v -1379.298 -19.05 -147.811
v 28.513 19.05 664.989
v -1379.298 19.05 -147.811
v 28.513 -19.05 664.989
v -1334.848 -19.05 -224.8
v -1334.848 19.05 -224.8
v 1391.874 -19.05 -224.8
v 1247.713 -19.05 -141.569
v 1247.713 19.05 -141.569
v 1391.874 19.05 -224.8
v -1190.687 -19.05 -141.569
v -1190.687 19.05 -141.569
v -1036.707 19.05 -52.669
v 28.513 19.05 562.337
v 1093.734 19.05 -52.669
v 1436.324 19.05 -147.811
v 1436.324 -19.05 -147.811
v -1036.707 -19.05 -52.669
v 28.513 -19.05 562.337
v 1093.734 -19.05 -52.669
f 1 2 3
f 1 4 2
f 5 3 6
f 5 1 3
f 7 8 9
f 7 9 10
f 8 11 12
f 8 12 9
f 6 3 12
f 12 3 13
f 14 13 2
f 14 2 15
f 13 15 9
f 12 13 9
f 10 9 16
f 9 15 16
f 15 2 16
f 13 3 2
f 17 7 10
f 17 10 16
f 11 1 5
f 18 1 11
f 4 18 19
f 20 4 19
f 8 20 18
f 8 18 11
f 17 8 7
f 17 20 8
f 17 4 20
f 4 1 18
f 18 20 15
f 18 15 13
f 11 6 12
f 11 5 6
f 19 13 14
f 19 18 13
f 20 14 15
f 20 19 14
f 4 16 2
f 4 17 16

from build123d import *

# Parameters (mm, degrees)
F1_DEPTH = 19.05


with BuildPart() as f1:
    # F0 (on Front) → F1 (new body, symmetric)
    with BuildSketch(Plane.XZ):
        Polygon((-1334.847673, -224.800255), (-1190.686777, -141.568923), (1247.713223, -141.568923), (1391.874119, -224.800255), (1436.324119, -147.810597), (28.513223, 664.989403), (-1379.297673, -147.810597), align=None)
        Polygon((1093.733906, -52.668923), (-1036.70746, -52.668923), (28.513223, 562.336525), align=None, mode=Mode.SUBTRACT)
    extrude(amount=F1_DEPTH, both=True)


solid = f1.part
